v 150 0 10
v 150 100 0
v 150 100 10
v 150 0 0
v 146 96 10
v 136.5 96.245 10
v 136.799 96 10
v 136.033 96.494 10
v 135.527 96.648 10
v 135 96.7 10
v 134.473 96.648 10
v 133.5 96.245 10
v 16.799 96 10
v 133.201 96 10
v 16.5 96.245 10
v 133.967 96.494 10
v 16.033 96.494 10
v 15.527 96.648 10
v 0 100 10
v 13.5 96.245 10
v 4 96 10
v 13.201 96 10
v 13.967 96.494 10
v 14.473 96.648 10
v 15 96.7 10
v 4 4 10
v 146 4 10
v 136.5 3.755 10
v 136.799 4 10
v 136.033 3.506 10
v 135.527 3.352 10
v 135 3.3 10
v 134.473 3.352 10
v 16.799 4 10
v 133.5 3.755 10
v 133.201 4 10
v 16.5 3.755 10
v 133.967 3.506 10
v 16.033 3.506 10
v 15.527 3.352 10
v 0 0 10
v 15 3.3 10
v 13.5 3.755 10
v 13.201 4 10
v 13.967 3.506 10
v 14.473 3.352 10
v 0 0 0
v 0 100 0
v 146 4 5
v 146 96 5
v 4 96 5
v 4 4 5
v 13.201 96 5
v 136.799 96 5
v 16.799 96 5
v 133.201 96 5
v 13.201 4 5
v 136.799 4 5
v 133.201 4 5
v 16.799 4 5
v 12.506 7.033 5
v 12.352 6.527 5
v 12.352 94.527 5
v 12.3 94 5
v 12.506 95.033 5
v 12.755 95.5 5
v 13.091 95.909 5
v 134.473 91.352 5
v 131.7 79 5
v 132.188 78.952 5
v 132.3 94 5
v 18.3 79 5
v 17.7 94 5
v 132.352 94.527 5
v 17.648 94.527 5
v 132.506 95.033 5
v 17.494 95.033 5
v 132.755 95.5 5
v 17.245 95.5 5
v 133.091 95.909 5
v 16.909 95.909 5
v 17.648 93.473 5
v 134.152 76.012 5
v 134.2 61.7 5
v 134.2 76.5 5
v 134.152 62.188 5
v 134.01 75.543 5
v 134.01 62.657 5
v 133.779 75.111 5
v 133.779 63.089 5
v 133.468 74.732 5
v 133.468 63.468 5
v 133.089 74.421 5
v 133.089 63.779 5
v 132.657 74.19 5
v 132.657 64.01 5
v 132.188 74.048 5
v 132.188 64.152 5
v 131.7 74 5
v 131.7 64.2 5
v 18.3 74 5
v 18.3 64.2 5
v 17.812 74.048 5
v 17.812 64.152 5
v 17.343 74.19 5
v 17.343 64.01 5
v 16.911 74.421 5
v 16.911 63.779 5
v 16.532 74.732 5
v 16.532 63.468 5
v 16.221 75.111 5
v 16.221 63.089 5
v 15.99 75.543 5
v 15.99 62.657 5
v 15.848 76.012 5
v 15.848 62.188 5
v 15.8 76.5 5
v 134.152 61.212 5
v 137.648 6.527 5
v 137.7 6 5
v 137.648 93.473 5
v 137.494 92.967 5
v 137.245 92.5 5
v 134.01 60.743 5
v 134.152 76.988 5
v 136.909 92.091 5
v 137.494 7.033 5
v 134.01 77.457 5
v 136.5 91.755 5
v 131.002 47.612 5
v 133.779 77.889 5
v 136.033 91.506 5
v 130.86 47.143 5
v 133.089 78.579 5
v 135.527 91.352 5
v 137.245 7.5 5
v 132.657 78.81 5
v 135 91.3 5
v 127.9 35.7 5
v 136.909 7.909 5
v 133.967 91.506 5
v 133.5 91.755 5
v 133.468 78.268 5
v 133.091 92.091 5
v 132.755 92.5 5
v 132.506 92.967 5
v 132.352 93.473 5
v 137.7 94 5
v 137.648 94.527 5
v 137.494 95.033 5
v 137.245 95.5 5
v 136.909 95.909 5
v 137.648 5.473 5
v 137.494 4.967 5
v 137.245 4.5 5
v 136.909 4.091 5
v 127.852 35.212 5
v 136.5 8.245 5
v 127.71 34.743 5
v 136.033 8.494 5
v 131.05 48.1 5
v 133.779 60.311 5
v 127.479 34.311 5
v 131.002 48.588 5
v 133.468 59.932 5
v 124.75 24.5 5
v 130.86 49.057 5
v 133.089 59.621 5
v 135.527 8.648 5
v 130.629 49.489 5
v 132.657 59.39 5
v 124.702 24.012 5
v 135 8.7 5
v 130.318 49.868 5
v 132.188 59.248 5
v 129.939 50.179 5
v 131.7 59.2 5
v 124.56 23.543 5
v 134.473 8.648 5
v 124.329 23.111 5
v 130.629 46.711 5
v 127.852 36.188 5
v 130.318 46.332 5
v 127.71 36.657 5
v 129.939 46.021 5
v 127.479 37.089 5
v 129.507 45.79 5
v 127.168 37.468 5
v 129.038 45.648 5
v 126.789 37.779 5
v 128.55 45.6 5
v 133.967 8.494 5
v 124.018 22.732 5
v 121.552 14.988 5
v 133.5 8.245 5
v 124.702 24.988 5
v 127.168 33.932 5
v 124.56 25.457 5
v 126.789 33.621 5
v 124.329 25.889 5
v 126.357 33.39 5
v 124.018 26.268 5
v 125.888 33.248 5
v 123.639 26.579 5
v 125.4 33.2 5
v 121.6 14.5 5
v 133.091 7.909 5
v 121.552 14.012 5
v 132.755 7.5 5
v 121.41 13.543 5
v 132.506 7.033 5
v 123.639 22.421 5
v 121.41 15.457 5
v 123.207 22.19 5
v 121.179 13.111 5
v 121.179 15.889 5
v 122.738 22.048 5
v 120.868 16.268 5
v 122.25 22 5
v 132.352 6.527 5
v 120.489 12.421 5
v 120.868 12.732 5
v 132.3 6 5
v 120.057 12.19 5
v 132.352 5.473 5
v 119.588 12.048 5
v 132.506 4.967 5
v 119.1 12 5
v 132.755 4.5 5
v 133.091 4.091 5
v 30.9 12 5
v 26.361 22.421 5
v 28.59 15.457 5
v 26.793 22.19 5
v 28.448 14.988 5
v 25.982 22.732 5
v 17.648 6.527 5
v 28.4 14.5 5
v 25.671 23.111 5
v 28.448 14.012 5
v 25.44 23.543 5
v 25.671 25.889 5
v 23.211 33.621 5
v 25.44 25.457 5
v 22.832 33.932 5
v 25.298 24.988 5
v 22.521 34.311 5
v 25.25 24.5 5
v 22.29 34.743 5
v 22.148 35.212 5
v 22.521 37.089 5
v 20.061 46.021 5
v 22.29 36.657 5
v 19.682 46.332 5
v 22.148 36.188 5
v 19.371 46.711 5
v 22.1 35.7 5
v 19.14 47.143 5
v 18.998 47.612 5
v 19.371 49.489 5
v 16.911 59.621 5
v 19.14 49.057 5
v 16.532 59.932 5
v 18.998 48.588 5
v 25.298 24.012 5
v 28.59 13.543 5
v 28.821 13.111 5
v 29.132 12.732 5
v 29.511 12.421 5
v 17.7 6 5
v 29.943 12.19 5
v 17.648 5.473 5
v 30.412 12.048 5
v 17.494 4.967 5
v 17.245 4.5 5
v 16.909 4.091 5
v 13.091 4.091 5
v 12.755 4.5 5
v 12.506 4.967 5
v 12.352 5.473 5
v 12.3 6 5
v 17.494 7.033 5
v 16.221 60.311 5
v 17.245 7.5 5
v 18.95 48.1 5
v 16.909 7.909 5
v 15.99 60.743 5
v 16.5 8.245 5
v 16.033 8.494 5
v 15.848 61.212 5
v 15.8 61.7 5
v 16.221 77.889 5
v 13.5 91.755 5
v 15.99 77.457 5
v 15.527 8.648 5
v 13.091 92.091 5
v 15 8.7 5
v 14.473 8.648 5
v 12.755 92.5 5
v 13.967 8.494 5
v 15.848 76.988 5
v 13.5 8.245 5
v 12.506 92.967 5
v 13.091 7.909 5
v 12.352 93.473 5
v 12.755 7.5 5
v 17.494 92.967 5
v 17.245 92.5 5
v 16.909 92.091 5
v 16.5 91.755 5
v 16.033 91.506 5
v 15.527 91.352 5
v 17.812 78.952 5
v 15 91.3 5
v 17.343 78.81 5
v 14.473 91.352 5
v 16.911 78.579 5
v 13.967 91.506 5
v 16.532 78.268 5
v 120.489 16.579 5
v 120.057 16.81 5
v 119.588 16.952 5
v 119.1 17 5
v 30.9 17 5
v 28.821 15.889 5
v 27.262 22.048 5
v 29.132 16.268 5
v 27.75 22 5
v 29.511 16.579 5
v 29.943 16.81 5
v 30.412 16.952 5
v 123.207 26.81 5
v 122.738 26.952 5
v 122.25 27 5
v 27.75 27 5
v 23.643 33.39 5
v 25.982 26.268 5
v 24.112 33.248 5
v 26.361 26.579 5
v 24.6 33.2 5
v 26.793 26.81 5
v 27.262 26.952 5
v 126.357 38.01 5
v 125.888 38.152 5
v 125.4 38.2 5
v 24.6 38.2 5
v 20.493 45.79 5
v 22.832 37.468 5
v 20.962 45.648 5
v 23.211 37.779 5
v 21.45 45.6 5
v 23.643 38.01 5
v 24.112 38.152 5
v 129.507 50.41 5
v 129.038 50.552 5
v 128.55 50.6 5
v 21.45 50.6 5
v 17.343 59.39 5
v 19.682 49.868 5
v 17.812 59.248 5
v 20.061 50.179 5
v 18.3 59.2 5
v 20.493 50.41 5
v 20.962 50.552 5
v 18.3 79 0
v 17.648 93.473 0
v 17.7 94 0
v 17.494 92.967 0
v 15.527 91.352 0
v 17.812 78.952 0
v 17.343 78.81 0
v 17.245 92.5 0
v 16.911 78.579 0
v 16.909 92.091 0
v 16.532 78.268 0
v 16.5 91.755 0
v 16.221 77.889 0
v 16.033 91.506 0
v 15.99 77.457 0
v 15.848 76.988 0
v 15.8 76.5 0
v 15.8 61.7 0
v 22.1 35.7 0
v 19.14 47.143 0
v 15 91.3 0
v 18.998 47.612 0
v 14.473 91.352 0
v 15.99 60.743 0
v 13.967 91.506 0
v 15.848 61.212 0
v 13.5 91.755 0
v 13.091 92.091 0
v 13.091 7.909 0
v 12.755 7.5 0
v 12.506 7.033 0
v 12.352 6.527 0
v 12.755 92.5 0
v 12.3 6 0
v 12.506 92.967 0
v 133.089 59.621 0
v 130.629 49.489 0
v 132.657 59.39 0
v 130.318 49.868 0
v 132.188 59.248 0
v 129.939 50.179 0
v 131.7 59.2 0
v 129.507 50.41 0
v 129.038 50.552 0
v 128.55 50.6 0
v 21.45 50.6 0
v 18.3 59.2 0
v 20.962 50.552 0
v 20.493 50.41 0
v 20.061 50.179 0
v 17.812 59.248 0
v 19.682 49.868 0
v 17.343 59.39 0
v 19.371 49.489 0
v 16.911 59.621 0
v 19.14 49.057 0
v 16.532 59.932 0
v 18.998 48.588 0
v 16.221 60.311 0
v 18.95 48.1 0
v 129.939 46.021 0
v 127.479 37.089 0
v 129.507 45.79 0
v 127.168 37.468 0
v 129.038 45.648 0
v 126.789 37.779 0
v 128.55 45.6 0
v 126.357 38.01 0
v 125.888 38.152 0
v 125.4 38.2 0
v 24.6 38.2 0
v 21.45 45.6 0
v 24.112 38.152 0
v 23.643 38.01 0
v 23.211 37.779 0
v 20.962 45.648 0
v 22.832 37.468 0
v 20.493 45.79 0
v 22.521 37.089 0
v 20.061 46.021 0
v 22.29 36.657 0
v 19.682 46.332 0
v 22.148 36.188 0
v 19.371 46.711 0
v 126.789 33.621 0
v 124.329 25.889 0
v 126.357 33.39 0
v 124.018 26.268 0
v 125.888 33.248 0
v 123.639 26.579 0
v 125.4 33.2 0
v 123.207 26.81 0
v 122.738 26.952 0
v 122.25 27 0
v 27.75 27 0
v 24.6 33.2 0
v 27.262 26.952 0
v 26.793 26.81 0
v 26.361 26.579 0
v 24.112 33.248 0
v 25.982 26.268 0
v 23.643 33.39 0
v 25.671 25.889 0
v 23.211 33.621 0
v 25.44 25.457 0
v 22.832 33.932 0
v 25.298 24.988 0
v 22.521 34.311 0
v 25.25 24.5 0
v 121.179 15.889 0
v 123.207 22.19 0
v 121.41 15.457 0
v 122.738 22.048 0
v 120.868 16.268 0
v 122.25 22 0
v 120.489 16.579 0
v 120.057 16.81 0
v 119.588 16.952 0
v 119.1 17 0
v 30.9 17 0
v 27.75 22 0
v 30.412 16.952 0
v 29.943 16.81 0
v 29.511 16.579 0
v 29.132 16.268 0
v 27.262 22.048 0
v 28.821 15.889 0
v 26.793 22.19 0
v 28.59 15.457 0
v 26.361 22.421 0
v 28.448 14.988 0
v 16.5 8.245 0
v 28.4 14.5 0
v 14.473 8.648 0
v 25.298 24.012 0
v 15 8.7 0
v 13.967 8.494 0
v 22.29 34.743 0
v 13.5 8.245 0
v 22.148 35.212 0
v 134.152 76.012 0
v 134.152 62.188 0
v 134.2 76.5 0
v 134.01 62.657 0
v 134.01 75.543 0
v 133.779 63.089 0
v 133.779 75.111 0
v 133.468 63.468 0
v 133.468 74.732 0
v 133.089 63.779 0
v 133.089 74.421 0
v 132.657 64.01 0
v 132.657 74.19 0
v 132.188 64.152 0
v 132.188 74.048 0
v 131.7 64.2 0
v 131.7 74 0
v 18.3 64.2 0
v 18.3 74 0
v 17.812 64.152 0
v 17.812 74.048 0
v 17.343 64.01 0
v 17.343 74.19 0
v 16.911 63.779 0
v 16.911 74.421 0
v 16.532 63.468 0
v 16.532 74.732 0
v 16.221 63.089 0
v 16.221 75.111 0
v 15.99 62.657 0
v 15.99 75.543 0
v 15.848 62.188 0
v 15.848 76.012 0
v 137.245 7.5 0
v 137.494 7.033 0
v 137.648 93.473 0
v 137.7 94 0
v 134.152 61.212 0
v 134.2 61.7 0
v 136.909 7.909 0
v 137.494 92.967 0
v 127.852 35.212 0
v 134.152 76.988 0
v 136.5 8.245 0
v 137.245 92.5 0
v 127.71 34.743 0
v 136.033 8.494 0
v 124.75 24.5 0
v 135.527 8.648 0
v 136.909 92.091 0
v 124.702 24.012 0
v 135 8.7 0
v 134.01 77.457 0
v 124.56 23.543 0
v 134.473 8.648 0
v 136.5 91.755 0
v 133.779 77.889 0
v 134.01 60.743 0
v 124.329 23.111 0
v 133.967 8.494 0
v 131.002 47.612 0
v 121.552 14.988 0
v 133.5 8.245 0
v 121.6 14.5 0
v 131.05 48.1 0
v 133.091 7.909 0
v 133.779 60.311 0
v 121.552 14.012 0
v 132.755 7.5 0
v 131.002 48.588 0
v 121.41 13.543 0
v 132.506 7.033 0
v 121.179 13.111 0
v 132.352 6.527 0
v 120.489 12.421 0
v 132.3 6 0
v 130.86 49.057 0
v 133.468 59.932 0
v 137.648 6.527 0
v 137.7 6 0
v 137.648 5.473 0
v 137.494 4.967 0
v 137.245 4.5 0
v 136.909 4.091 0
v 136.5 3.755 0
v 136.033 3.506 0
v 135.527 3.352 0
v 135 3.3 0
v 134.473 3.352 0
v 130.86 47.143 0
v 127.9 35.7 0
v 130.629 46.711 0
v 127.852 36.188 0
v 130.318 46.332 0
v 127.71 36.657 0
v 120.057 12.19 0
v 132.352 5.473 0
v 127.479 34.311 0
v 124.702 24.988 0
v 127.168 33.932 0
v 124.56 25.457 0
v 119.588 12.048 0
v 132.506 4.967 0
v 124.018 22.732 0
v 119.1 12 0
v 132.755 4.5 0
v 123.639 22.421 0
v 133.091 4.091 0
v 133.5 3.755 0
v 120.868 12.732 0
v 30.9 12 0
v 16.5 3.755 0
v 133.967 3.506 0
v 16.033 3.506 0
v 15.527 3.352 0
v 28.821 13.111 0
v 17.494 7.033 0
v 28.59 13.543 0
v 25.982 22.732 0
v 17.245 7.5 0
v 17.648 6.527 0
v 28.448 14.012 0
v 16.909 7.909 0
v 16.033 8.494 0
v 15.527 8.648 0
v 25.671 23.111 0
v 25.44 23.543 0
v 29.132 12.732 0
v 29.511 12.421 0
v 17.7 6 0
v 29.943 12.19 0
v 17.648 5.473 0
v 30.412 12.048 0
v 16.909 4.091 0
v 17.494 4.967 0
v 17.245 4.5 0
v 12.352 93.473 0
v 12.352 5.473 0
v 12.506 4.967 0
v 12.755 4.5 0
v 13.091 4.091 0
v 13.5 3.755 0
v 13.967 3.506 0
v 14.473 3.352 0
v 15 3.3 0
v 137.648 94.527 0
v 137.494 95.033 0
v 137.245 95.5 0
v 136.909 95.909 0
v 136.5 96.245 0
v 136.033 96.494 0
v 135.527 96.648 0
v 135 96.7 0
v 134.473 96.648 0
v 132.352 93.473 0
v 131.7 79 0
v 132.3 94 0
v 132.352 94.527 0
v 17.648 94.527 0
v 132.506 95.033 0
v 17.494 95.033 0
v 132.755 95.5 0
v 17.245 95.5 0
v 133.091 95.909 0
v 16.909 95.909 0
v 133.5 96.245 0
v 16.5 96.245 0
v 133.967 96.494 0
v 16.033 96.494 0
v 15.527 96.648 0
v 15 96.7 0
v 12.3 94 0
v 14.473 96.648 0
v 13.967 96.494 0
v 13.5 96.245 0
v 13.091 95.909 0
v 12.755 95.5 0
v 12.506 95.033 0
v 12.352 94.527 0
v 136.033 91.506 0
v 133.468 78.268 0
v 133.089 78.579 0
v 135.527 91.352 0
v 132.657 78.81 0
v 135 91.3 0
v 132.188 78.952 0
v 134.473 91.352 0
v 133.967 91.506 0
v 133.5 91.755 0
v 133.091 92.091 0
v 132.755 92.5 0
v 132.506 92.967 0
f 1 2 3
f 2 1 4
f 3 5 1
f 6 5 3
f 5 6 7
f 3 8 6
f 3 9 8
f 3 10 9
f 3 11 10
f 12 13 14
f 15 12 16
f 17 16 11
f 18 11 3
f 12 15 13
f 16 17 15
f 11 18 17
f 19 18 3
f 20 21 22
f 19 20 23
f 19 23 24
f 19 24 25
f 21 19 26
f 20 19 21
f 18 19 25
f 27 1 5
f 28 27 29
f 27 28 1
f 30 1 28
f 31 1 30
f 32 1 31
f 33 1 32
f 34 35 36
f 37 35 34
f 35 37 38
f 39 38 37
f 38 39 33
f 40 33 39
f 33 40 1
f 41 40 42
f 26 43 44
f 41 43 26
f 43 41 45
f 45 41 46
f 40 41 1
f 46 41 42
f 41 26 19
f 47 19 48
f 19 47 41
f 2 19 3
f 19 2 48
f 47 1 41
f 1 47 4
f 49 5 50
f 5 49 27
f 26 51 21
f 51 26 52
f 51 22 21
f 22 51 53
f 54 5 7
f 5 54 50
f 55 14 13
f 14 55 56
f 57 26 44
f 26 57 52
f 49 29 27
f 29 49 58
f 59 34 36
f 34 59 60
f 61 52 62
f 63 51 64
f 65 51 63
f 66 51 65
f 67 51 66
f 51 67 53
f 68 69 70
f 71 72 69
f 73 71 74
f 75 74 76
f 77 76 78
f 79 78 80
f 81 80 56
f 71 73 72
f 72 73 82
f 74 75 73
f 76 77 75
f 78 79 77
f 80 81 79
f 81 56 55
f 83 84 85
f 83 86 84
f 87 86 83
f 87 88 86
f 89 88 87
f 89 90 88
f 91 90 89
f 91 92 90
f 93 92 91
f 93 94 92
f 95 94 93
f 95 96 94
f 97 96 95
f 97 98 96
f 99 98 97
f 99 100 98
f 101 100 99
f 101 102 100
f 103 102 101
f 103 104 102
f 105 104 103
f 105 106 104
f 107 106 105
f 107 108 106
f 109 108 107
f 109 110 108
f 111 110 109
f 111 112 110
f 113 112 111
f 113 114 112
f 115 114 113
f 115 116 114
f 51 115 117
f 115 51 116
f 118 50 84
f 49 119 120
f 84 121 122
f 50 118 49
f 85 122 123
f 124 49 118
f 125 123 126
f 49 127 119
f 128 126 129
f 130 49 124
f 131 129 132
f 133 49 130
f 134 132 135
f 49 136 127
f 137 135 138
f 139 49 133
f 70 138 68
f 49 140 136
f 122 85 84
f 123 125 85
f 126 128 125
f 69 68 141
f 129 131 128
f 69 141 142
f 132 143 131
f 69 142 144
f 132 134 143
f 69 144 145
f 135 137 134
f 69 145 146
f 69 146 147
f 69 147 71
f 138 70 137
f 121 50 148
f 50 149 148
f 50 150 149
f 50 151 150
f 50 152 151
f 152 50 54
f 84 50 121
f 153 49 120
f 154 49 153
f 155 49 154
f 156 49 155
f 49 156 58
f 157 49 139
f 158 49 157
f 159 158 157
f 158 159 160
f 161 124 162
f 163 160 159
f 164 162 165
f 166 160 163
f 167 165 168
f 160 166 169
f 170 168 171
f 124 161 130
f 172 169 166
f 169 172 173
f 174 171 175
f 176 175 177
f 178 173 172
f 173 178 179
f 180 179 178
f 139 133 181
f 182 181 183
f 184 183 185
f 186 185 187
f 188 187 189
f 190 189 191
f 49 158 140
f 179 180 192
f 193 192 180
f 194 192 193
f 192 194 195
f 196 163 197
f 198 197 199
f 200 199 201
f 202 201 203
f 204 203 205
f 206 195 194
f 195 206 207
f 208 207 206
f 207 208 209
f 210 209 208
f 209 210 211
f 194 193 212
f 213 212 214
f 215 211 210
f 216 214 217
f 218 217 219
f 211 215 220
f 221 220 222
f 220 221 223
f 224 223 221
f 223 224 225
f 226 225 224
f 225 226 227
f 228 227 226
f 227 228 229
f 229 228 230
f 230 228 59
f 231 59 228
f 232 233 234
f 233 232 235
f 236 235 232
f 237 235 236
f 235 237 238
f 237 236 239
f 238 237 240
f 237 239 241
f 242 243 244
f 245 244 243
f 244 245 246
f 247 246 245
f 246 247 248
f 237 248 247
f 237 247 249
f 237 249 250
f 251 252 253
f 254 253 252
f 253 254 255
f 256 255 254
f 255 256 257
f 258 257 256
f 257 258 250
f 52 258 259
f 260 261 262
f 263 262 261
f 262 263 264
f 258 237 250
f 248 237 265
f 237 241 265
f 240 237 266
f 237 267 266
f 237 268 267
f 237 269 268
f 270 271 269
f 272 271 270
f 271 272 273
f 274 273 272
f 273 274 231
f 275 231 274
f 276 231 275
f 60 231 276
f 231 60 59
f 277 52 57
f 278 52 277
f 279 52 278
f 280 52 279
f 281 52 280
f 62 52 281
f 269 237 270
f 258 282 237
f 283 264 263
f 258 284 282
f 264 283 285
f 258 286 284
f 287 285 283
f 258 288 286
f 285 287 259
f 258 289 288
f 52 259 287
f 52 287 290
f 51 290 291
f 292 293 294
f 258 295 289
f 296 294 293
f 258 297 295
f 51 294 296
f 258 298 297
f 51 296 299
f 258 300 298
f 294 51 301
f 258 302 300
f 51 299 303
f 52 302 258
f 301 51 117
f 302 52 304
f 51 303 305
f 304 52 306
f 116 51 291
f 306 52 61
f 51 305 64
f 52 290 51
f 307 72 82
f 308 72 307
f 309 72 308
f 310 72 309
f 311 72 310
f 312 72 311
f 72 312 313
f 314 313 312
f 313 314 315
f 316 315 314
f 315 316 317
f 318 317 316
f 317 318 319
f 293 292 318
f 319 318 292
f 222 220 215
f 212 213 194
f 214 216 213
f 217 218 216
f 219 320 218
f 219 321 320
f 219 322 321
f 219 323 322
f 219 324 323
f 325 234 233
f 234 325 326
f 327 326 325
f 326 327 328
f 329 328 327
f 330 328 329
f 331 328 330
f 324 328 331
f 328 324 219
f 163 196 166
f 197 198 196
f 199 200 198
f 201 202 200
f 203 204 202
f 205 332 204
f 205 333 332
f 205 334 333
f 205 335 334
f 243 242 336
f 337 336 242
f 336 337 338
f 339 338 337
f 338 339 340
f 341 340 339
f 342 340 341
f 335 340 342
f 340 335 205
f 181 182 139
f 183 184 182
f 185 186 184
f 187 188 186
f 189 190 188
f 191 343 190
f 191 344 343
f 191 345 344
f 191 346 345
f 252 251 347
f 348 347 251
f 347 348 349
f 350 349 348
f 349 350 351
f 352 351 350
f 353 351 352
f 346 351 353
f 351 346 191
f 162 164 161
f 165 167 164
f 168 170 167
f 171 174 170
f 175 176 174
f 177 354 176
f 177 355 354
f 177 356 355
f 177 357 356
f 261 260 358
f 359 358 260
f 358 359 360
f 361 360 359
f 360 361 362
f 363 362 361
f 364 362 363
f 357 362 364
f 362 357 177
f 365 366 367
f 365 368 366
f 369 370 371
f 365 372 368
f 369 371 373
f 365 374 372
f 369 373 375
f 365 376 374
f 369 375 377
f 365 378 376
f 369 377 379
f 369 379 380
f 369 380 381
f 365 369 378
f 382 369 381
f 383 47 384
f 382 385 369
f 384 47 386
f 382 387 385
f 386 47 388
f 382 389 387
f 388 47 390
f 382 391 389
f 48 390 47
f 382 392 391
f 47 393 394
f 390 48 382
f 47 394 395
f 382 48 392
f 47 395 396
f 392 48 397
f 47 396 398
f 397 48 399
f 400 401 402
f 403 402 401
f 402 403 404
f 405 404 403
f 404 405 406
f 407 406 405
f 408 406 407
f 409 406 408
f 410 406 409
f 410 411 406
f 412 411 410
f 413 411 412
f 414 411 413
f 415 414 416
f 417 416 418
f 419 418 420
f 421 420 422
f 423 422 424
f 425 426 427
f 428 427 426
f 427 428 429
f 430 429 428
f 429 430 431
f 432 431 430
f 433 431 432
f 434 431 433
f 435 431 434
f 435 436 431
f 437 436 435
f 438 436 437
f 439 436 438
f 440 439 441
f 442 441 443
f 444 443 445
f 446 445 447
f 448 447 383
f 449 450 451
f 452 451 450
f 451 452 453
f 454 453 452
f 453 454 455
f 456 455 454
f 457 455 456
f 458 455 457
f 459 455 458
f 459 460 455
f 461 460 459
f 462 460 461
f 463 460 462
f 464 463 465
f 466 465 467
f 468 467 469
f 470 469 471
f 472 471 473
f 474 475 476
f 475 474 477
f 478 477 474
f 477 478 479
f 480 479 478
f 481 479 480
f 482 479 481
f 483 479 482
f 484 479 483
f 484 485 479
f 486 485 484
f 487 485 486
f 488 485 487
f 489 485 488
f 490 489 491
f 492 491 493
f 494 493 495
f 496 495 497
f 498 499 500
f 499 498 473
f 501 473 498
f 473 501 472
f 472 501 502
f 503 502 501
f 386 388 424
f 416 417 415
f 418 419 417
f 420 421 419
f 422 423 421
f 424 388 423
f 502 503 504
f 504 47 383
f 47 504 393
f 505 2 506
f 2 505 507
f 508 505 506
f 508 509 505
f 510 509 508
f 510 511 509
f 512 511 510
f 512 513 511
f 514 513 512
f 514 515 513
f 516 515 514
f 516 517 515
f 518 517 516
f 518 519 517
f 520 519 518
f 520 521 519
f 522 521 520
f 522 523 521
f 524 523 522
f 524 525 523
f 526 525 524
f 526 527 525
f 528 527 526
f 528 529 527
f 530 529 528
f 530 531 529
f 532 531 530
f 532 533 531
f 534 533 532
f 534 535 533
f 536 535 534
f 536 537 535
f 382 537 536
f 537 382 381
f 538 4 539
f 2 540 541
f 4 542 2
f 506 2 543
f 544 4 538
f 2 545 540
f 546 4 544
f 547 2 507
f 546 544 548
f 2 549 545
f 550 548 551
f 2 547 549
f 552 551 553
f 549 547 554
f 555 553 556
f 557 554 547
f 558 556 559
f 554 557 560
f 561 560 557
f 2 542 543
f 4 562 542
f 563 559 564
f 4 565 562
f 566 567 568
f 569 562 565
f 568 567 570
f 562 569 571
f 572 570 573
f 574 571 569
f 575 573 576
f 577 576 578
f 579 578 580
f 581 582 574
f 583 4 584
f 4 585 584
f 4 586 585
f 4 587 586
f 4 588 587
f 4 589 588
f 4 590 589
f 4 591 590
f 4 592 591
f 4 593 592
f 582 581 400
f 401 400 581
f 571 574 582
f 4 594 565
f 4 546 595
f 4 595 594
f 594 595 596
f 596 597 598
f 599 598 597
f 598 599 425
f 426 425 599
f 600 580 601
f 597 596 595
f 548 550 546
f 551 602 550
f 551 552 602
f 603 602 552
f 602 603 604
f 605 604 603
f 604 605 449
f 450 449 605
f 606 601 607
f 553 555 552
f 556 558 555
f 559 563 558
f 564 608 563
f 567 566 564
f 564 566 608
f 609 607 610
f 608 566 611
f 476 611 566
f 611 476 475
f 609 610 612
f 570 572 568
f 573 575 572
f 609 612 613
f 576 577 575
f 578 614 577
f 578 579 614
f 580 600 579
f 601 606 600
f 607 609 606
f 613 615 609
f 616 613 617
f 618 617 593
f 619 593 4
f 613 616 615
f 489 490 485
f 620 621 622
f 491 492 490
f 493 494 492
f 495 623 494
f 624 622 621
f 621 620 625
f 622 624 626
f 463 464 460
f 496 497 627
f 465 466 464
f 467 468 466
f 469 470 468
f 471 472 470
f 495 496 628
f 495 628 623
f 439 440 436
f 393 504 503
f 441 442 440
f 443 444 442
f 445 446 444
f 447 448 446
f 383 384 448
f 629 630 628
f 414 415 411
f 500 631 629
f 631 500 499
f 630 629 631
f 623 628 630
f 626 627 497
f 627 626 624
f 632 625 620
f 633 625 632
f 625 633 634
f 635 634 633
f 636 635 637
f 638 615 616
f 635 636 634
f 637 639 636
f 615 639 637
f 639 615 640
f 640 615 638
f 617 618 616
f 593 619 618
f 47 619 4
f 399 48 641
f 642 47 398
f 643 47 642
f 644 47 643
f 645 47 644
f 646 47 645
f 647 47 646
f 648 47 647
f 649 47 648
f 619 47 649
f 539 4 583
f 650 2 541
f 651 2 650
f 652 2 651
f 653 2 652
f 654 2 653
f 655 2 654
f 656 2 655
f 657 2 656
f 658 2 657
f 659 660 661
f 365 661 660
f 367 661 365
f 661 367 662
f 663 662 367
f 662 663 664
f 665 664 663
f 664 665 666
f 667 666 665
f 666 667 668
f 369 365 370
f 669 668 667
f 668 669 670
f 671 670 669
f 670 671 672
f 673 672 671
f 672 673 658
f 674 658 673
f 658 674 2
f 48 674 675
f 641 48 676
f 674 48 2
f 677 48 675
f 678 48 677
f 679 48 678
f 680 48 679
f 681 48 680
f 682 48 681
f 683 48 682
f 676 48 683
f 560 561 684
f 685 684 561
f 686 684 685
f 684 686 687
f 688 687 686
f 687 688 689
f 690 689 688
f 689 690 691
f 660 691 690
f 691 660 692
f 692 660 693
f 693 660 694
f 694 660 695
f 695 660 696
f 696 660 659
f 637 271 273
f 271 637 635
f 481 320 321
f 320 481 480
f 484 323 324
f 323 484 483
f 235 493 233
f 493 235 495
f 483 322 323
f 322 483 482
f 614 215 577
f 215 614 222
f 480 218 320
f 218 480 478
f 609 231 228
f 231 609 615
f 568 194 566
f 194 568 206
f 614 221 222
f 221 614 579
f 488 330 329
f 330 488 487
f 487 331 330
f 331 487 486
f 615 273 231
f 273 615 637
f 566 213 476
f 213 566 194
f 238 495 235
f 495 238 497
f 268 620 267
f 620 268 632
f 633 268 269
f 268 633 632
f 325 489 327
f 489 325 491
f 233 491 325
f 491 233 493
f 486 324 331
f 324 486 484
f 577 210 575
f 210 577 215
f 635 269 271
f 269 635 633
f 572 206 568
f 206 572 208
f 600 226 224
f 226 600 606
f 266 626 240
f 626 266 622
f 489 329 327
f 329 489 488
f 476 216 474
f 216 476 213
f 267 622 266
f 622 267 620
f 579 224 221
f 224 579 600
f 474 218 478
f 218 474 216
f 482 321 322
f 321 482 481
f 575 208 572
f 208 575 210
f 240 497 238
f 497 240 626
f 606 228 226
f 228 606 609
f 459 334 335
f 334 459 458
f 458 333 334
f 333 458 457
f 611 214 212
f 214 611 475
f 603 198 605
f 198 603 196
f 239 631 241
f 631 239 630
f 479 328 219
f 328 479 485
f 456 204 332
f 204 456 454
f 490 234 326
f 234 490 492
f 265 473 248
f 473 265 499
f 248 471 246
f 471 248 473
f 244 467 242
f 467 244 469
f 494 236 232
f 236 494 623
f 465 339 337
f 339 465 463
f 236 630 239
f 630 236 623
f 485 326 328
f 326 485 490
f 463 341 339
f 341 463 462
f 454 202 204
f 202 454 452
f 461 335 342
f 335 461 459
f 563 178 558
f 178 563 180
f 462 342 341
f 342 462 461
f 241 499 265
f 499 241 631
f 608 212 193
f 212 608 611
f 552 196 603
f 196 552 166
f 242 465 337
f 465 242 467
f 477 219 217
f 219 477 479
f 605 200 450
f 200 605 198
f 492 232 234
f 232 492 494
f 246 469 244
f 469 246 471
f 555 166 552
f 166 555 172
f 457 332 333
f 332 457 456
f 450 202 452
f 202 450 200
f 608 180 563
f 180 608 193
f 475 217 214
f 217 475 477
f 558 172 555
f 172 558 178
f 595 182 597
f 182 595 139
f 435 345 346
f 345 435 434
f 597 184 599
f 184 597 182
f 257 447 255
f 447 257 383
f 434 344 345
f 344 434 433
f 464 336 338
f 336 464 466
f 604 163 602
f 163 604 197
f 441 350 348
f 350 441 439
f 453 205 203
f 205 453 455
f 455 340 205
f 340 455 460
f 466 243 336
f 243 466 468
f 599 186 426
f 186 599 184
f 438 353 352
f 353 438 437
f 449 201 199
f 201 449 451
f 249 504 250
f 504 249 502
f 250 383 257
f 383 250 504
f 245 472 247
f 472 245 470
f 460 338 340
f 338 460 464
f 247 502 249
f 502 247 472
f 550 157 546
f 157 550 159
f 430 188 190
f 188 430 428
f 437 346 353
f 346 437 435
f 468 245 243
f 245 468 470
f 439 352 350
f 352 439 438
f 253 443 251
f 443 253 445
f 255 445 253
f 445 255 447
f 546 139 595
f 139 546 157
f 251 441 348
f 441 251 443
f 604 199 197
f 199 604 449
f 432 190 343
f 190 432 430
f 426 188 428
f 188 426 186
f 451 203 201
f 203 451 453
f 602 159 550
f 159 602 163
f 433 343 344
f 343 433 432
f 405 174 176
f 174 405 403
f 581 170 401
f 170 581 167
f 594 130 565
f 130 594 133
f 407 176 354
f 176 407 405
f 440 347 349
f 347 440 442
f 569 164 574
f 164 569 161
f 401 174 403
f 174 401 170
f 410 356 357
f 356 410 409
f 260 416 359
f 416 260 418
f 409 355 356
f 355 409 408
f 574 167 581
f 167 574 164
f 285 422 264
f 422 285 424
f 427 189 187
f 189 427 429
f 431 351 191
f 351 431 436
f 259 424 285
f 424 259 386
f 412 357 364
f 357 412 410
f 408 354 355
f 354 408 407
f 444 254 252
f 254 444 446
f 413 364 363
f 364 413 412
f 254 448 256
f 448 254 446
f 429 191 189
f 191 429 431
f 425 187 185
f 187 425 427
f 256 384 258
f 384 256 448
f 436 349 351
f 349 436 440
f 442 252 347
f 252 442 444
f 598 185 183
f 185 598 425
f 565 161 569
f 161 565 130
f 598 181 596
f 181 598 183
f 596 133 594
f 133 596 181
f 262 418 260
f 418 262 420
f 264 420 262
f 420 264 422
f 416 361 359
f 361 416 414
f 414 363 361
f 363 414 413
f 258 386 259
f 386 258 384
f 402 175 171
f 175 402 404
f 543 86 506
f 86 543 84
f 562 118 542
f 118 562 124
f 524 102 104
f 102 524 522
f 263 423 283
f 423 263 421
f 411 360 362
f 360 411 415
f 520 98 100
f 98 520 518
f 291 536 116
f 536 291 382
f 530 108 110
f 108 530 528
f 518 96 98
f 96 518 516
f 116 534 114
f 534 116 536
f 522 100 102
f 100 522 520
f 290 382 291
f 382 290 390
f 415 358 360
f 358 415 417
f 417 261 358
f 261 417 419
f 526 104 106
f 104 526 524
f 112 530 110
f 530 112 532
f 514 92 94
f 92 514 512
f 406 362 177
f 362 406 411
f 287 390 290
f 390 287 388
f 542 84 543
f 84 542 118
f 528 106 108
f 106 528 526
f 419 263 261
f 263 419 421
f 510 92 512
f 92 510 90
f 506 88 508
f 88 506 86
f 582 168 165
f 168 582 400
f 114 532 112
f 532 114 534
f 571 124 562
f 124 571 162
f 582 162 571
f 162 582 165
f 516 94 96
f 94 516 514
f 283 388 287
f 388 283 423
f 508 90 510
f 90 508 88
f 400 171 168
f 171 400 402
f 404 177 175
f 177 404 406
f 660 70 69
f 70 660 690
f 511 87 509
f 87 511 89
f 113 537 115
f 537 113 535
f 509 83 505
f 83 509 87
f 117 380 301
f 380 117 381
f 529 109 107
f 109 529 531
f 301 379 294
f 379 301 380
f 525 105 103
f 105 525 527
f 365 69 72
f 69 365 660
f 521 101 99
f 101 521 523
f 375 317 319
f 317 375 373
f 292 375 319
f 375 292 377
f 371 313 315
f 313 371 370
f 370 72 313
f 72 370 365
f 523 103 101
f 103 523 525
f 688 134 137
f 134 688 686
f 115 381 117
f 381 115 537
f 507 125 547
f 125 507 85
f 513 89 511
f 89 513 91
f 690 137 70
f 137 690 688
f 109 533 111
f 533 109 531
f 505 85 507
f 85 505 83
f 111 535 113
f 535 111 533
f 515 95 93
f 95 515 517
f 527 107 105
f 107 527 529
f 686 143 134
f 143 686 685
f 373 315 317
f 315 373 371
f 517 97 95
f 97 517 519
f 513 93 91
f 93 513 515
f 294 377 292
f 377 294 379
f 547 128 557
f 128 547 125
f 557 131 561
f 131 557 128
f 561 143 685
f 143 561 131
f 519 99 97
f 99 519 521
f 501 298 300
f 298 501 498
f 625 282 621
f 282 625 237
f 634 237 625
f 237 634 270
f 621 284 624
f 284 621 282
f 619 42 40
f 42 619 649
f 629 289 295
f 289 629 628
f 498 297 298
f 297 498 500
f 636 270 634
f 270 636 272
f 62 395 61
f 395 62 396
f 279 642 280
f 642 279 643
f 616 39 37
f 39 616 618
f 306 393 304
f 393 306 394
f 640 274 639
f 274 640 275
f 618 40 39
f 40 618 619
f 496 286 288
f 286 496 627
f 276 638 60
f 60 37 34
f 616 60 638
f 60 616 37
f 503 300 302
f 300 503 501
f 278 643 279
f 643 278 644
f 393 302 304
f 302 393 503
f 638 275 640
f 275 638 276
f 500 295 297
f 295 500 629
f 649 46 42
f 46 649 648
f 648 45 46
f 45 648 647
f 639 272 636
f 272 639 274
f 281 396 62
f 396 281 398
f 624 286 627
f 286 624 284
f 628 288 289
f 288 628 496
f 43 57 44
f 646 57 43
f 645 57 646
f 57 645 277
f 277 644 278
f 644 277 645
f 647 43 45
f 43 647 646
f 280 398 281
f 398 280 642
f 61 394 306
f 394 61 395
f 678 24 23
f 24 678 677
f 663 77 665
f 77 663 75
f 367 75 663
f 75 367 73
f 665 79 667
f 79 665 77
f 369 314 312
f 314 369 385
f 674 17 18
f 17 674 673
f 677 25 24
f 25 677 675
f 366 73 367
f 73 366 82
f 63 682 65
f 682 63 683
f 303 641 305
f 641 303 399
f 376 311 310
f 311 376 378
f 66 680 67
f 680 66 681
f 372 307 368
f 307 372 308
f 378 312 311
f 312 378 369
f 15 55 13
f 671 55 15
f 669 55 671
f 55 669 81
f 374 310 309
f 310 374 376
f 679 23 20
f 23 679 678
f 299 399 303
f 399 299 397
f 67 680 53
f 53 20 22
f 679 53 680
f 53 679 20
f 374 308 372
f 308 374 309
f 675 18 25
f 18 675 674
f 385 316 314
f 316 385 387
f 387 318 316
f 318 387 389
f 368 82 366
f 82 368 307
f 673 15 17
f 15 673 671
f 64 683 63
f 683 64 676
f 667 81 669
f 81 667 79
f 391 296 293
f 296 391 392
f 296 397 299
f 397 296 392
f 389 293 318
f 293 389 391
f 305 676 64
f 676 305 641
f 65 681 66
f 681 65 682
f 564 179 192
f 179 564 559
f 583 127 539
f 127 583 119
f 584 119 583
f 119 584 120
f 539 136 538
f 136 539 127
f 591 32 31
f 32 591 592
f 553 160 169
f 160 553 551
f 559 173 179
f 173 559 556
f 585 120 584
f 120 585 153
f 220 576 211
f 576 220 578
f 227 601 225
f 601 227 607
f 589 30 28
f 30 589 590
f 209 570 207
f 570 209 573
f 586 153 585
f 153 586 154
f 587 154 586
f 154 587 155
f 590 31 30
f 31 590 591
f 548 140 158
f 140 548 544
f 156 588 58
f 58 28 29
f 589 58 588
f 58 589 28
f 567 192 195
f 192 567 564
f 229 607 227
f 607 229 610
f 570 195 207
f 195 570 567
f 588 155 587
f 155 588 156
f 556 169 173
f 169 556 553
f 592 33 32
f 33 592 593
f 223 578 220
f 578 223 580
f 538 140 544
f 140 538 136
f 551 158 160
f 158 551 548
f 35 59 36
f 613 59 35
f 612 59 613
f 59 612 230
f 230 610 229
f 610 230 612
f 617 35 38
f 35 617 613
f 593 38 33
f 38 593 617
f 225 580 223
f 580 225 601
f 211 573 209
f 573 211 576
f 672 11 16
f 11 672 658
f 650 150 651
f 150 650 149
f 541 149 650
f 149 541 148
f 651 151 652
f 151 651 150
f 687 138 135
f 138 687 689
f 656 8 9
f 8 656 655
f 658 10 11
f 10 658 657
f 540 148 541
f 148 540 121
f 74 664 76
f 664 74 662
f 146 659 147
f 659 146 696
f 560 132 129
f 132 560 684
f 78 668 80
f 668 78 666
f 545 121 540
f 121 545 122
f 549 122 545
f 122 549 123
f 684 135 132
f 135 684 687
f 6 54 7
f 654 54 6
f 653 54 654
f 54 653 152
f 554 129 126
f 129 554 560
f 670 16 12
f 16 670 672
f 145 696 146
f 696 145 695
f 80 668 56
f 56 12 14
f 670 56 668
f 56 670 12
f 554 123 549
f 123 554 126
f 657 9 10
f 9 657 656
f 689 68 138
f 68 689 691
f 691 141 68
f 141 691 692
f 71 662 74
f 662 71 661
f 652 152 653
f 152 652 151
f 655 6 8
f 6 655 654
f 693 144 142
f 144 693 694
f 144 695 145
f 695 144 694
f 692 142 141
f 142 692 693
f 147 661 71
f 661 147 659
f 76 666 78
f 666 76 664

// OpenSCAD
$fn = 32;

// ----------------------------------------------------------------------
// Slotted panel: 150 x 100 mm, 6 рядов of slots
// ----------------------------------------------------------------------

// --- parameters (mm) ---
panel_w = 150;            // panel width
panel_d = 100;            // panel depth
thick = 5;                // panel thickness
slot_w = 5;               // slot width
pitch0 = 10;              // first row pitch
pitch_step = 1.2;         // pitch increase per row
margin = 12;              // margin around the slot field
rows = 6;                 // number of slot rows
mount_d = 5.4;            // mounting holes
mount_x = 60;             // mounting hole offset
rim_h = 10;               // rim height
rim_t = 4;                // rim wall thickness

difference() {
  union() {
    cube([panel_w, panel_d, thick]);
    translate([0, 0, thick - 1]) difference() {
      cube([panel_w, panel_d, rim_h - thick + 1]);
      translate([rim_t, rim_t, -2.5]) cube([panel_w - 2 * rim_t, panel_d - 2 * rim_t, rim_h - thick + 6]);
    }
  }
  /* slot rows: stadium shaped cutters, 2.5 mm clear of both faces */
  /* row 0: pitch 10, length 88.2 */
  hull() {
    translate([30.9, 14.5, -2.5]) cylinder(h = thick + 5, d = slot_w);
    translate([119.1, 14.5, -2.5]) cylinder(h = thick + 5, d = slot_w);
  }
  /* row 1: pitch 11.2, length 94.5 */
  hull() {
    translate([27.75, 24.5, -2.5]) cylinder(h = thick + 5, d = slot_w);
    translate([122.25, 24.5, -2.5]) cylinder(h = thick + 5, d = slot_w);
  }
  /* row 2: pitch 12.4, length 100.8 */
  hull() {
    translate([24.6, 35.7, -2.5]) cylinder(h = thick + 5, d = slot_w);
    translate([125.4, 35.7, -2.5]) cylinder(h = thick + 5, d = slot_w);
  }
  /* row 3: pitch 13.6, length 107.1 */
  hull() {
    translate([21.45, 48.1, -2.5]) cylinder(h = thick + 5, d = slot_w);
    translate([128.55, 48.1, -2.5]) cylinder(h = thick + 5, d = slot_w);
  }
  /* row 4: pitch 14.8, length 113.4 */
  hull() {
    translate([18.3, 61.7, -2.5]) cylinder(h = thick + 5, d = slot_w);
    translate([131.7, 61.7, -2.5]) cylinder(h = thick + 5, d = slot_w);
  }
  /* row 5: pitch 16, length 113.4 */
  hull() {
    translate([18.3, 76.5, -2.5]) cylinder(h = thick + 5, d = slot_w);
    translate([131.7, 76.5, -2.5]) cylinder(h = thick + 5, d = slot_w);
  }
  translate([15, 6, -2.5]) cylinder(h = 15, d = mount_d);
  translate([15, 94, -2.5]) cylinder(h = 15, d = mount_d);
  translate([135, 6, -2.5]) cylinder(h = 15, d = mount_d);
  translate([135, 94, -2.5]) cylinder(h = 15, d = mount_d);
}
